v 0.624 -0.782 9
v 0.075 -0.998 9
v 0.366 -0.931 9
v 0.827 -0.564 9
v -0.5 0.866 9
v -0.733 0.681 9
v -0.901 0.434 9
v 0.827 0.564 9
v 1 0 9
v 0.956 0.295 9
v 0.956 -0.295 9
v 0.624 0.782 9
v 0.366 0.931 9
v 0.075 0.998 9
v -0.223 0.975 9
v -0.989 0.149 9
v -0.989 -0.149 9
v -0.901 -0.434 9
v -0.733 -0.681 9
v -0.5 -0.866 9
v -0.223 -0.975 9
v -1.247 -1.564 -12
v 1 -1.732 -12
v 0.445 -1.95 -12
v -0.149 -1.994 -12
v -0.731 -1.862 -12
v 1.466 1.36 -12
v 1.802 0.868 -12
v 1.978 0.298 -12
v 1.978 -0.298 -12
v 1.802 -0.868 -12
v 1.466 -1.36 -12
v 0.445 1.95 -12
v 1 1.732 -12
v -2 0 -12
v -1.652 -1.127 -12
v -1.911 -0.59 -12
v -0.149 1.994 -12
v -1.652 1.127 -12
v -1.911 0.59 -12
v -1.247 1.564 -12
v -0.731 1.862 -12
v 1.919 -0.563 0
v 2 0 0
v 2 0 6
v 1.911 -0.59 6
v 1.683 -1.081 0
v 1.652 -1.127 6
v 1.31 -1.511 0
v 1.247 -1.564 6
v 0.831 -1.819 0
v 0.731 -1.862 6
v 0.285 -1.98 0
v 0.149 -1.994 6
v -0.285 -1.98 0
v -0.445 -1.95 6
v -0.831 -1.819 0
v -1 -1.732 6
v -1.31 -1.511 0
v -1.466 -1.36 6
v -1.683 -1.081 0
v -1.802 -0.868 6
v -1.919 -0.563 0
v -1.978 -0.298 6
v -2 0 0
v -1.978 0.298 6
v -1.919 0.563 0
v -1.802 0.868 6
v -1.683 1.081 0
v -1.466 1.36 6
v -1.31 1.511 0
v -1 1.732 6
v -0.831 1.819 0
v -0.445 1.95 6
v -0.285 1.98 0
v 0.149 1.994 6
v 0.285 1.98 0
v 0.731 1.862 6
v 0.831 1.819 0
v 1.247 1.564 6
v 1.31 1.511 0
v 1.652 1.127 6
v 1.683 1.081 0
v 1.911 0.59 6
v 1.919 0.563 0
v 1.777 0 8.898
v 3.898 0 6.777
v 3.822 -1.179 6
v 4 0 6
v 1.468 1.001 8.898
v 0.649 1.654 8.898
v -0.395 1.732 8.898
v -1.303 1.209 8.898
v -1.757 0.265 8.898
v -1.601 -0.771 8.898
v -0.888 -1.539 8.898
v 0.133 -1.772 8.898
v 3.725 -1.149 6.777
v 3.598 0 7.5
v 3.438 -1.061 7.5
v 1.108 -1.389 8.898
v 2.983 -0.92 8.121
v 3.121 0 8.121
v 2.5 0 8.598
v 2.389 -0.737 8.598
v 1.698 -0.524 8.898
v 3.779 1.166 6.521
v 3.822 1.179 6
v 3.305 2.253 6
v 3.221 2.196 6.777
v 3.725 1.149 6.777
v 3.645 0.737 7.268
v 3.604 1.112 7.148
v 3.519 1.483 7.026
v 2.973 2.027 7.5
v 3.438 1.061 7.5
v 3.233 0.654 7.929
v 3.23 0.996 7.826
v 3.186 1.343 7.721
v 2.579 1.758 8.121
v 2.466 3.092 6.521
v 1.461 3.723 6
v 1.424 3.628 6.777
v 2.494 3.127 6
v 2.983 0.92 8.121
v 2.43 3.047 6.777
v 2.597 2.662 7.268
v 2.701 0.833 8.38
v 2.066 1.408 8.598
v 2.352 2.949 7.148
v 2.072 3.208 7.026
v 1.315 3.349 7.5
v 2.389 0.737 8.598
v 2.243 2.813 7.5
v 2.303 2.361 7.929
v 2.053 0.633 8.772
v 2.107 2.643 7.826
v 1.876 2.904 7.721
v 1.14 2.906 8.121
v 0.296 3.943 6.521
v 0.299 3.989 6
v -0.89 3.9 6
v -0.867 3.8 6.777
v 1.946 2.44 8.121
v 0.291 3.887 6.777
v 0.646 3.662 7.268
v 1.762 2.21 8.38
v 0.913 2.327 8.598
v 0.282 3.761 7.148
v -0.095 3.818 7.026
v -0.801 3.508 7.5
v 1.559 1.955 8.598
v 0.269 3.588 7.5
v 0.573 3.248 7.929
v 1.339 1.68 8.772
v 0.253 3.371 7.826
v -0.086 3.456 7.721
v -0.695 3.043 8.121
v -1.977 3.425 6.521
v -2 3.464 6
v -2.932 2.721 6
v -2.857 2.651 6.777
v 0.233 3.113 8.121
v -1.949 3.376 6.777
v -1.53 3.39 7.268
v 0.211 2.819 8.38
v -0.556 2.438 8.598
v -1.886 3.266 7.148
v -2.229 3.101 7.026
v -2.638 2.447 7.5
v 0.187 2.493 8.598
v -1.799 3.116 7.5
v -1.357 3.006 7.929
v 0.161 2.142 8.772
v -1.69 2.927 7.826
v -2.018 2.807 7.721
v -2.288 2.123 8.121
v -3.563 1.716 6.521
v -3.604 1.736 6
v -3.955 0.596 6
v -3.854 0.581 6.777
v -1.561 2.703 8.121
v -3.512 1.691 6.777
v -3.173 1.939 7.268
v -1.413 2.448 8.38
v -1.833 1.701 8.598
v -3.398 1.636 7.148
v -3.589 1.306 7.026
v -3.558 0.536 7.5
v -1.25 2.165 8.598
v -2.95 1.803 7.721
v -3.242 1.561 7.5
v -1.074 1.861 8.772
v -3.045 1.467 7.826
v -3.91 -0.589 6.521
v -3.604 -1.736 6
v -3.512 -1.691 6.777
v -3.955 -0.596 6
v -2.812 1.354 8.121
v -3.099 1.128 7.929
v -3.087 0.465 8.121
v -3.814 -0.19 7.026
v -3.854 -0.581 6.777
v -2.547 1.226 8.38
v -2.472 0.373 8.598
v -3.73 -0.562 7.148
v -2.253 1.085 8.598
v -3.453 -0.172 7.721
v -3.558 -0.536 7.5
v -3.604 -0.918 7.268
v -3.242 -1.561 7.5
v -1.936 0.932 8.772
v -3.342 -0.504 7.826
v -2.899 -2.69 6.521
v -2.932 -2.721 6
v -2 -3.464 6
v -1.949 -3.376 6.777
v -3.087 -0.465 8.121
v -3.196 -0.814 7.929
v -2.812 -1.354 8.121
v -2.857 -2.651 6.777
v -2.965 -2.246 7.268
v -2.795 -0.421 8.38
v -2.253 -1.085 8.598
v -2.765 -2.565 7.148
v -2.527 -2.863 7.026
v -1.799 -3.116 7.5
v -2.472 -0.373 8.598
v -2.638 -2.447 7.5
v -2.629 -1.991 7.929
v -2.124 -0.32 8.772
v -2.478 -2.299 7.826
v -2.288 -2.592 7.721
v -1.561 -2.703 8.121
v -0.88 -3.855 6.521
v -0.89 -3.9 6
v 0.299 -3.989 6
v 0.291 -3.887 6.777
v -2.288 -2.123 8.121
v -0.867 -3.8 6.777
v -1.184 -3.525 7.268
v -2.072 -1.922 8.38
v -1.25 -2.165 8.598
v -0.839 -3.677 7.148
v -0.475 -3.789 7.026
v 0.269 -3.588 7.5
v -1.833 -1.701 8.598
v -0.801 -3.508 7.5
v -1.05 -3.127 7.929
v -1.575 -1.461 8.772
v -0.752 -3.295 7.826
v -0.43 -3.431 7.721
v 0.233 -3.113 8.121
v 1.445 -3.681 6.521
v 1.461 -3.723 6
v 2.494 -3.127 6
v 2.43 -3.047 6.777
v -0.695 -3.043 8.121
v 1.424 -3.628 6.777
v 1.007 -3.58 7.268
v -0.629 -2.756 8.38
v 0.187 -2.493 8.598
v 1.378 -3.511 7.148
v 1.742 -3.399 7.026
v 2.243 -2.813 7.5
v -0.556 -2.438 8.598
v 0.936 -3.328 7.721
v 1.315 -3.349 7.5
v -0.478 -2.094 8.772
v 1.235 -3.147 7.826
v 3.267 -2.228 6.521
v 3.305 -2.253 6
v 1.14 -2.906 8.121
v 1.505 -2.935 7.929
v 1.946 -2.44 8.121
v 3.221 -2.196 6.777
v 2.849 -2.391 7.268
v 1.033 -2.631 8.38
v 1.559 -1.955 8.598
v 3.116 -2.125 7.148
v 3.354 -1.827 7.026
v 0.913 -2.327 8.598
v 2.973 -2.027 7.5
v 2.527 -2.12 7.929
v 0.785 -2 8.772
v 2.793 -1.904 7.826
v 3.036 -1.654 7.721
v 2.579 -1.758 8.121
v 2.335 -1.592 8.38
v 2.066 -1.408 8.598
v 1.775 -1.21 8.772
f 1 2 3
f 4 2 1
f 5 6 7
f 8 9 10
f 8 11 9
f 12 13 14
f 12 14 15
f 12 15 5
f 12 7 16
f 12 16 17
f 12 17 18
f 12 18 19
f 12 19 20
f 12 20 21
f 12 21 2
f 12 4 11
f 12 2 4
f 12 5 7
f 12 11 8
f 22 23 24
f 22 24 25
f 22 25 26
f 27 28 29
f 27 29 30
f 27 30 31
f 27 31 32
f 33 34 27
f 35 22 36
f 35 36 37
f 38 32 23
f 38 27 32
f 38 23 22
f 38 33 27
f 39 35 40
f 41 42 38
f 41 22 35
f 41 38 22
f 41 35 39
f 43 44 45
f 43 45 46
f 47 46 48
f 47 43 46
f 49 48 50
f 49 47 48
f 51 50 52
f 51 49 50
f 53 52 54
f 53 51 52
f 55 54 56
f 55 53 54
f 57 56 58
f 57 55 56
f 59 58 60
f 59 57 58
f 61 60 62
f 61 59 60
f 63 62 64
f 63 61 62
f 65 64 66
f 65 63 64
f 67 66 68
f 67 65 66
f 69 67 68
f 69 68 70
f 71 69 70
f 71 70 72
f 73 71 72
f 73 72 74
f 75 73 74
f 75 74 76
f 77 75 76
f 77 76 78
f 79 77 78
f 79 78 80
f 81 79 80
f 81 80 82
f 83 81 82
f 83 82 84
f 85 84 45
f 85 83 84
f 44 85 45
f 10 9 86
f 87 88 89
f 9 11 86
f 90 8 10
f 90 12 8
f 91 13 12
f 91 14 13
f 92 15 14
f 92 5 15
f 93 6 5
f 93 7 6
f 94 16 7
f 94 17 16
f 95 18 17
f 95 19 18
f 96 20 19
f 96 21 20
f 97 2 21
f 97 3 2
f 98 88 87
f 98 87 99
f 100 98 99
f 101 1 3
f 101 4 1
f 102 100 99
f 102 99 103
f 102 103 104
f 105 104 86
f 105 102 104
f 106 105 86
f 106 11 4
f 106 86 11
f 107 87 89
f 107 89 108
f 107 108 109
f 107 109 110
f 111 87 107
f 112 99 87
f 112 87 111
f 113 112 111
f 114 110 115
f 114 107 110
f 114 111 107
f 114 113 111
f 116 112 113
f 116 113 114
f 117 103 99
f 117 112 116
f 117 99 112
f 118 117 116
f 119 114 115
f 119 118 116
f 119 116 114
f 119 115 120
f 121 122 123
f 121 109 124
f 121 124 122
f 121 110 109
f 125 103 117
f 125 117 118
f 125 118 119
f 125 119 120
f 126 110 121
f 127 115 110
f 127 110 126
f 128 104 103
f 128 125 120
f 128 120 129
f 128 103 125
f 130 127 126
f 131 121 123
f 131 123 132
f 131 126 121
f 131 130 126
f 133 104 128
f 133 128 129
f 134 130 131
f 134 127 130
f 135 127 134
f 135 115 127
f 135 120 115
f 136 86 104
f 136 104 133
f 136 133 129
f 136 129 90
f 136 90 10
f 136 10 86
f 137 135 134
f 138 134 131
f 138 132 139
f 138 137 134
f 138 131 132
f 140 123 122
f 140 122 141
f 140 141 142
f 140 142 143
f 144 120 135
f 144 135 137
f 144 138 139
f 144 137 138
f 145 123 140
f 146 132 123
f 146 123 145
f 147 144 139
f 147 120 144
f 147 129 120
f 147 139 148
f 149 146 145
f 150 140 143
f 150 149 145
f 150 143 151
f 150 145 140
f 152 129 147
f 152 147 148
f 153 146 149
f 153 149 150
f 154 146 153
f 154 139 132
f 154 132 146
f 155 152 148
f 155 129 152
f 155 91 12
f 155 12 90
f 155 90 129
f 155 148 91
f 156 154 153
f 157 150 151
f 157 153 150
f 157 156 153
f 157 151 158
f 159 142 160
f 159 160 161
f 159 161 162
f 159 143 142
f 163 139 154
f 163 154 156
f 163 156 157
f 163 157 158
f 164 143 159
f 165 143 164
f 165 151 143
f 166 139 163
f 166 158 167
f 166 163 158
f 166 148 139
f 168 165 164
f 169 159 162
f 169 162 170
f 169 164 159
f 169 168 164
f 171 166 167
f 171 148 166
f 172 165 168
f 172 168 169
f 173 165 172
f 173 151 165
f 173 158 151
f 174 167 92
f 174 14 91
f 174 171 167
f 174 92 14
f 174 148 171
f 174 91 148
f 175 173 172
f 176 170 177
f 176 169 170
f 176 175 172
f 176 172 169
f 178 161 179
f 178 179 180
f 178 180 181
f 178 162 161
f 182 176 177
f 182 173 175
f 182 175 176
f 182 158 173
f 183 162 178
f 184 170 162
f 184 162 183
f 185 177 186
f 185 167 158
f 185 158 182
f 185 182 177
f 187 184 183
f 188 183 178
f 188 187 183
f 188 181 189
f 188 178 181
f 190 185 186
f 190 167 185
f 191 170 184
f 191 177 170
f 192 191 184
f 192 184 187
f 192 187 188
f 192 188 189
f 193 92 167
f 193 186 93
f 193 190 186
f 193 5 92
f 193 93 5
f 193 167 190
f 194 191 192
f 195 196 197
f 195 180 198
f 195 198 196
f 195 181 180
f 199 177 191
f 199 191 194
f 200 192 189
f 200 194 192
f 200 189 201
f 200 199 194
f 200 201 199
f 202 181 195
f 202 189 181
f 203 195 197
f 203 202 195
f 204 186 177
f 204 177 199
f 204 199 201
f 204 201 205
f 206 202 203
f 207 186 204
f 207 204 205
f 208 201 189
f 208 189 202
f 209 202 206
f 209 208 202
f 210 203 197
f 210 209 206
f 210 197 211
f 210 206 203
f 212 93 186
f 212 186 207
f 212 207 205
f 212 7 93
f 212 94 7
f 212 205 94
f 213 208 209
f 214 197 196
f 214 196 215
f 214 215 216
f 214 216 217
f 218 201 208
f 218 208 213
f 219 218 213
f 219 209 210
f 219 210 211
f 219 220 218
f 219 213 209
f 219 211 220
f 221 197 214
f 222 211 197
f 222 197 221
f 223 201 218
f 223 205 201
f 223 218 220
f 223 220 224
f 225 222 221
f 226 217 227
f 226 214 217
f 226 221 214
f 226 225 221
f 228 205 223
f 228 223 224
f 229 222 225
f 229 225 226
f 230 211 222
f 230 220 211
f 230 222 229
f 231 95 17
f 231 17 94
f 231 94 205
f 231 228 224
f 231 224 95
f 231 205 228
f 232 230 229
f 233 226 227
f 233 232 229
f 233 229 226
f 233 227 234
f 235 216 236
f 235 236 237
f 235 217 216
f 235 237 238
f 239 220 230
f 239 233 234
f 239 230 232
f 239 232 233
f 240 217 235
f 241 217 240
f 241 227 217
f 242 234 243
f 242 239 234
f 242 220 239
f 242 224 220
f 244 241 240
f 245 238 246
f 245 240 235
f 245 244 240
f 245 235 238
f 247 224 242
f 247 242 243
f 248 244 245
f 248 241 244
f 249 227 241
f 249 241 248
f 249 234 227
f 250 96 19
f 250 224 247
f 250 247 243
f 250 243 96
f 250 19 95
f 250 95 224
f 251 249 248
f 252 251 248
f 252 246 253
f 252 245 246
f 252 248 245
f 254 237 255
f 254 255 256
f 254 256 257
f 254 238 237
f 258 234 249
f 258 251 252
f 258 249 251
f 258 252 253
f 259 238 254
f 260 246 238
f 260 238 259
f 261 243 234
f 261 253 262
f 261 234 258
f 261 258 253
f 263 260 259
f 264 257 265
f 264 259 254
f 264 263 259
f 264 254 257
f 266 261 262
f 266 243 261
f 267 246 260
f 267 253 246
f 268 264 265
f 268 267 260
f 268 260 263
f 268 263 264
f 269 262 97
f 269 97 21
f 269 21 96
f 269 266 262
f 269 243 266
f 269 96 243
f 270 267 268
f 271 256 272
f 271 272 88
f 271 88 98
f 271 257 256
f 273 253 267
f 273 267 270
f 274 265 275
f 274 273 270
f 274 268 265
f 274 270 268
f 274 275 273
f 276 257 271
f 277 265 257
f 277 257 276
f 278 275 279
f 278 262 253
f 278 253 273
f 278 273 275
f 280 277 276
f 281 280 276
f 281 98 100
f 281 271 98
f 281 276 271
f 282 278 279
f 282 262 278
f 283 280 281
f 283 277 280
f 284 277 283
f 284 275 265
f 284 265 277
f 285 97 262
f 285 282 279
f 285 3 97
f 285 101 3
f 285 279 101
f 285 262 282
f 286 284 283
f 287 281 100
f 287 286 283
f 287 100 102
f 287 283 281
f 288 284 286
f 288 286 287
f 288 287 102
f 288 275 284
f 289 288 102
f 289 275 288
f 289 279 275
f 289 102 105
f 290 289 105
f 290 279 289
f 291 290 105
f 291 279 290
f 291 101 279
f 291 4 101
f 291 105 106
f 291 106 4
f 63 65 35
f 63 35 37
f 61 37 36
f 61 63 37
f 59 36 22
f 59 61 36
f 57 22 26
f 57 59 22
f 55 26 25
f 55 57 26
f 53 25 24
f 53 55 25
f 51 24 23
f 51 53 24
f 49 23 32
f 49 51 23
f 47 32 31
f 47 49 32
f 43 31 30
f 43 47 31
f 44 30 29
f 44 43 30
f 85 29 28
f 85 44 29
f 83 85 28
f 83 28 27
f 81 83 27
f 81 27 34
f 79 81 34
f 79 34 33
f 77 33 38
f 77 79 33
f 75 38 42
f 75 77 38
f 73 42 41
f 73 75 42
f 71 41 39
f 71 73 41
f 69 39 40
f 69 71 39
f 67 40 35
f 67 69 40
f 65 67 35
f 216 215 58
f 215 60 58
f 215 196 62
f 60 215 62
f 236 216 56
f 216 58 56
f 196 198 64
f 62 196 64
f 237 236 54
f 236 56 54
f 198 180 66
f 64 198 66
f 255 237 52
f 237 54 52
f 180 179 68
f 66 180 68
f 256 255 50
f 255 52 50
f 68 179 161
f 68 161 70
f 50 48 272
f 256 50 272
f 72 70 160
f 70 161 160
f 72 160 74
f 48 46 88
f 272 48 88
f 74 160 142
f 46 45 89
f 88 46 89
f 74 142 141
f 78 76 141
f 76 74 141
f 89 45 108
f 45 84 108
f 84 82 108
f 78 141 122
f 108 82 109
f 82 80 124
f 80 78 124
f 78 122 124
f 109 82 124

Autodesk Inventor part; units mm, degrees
ref_plane "YZ Plane" through (0, 0, 0) normal (1, 0, 0) x (0, 1, 0)
ref_plane "XZ Plane" through (0, 0, 0) normal (0, 1, 0) x (-1, 0, 0)
ref_plane "XY Plane" through (0, 0, 0) normal (0, 0, 1) x (1, 0, 0)
sketch "スケッチ1" plane through (0, 0, 0) normal (0, 0, 1) x (1, 0, 0)
  circle A0 centre (0, 0) radius 2
  dimension "d0" = 4
extrude "押し出し1" add sketch "スケッチ1" along normal blind 6
sketch "スケッチ2" plane through (0, 0, 6) normal (0, 0, 1) x (1, 0, 0)
  circle A0 centre (0, 0) radius 2 projected
  circle A1 centre (0, 0) radius 4
  dimension "d3" = 8
extrude "押し出し2" add sketch "スケッチ2" along normal blind 3 contours A0 | A1
fillet "フィレット1" radius 3 1 edges at (-4, 0, 9)
thread "ねじ1" size "M4x0.7" class "6g" standard "ANSI Metric M Profile" full length
sketch "スケッチ3" plane through (0, 0, 0) normal (0, 0, -1) x (-1, 0, 0)
  circle A0 centre (0, 0) radius 2
extrude "押し出し3" add sketch "スケッチ3" along normal blind 12
properties part number "SB　M4 18mm なべネジ" material "Stainless Steel, 440C"
